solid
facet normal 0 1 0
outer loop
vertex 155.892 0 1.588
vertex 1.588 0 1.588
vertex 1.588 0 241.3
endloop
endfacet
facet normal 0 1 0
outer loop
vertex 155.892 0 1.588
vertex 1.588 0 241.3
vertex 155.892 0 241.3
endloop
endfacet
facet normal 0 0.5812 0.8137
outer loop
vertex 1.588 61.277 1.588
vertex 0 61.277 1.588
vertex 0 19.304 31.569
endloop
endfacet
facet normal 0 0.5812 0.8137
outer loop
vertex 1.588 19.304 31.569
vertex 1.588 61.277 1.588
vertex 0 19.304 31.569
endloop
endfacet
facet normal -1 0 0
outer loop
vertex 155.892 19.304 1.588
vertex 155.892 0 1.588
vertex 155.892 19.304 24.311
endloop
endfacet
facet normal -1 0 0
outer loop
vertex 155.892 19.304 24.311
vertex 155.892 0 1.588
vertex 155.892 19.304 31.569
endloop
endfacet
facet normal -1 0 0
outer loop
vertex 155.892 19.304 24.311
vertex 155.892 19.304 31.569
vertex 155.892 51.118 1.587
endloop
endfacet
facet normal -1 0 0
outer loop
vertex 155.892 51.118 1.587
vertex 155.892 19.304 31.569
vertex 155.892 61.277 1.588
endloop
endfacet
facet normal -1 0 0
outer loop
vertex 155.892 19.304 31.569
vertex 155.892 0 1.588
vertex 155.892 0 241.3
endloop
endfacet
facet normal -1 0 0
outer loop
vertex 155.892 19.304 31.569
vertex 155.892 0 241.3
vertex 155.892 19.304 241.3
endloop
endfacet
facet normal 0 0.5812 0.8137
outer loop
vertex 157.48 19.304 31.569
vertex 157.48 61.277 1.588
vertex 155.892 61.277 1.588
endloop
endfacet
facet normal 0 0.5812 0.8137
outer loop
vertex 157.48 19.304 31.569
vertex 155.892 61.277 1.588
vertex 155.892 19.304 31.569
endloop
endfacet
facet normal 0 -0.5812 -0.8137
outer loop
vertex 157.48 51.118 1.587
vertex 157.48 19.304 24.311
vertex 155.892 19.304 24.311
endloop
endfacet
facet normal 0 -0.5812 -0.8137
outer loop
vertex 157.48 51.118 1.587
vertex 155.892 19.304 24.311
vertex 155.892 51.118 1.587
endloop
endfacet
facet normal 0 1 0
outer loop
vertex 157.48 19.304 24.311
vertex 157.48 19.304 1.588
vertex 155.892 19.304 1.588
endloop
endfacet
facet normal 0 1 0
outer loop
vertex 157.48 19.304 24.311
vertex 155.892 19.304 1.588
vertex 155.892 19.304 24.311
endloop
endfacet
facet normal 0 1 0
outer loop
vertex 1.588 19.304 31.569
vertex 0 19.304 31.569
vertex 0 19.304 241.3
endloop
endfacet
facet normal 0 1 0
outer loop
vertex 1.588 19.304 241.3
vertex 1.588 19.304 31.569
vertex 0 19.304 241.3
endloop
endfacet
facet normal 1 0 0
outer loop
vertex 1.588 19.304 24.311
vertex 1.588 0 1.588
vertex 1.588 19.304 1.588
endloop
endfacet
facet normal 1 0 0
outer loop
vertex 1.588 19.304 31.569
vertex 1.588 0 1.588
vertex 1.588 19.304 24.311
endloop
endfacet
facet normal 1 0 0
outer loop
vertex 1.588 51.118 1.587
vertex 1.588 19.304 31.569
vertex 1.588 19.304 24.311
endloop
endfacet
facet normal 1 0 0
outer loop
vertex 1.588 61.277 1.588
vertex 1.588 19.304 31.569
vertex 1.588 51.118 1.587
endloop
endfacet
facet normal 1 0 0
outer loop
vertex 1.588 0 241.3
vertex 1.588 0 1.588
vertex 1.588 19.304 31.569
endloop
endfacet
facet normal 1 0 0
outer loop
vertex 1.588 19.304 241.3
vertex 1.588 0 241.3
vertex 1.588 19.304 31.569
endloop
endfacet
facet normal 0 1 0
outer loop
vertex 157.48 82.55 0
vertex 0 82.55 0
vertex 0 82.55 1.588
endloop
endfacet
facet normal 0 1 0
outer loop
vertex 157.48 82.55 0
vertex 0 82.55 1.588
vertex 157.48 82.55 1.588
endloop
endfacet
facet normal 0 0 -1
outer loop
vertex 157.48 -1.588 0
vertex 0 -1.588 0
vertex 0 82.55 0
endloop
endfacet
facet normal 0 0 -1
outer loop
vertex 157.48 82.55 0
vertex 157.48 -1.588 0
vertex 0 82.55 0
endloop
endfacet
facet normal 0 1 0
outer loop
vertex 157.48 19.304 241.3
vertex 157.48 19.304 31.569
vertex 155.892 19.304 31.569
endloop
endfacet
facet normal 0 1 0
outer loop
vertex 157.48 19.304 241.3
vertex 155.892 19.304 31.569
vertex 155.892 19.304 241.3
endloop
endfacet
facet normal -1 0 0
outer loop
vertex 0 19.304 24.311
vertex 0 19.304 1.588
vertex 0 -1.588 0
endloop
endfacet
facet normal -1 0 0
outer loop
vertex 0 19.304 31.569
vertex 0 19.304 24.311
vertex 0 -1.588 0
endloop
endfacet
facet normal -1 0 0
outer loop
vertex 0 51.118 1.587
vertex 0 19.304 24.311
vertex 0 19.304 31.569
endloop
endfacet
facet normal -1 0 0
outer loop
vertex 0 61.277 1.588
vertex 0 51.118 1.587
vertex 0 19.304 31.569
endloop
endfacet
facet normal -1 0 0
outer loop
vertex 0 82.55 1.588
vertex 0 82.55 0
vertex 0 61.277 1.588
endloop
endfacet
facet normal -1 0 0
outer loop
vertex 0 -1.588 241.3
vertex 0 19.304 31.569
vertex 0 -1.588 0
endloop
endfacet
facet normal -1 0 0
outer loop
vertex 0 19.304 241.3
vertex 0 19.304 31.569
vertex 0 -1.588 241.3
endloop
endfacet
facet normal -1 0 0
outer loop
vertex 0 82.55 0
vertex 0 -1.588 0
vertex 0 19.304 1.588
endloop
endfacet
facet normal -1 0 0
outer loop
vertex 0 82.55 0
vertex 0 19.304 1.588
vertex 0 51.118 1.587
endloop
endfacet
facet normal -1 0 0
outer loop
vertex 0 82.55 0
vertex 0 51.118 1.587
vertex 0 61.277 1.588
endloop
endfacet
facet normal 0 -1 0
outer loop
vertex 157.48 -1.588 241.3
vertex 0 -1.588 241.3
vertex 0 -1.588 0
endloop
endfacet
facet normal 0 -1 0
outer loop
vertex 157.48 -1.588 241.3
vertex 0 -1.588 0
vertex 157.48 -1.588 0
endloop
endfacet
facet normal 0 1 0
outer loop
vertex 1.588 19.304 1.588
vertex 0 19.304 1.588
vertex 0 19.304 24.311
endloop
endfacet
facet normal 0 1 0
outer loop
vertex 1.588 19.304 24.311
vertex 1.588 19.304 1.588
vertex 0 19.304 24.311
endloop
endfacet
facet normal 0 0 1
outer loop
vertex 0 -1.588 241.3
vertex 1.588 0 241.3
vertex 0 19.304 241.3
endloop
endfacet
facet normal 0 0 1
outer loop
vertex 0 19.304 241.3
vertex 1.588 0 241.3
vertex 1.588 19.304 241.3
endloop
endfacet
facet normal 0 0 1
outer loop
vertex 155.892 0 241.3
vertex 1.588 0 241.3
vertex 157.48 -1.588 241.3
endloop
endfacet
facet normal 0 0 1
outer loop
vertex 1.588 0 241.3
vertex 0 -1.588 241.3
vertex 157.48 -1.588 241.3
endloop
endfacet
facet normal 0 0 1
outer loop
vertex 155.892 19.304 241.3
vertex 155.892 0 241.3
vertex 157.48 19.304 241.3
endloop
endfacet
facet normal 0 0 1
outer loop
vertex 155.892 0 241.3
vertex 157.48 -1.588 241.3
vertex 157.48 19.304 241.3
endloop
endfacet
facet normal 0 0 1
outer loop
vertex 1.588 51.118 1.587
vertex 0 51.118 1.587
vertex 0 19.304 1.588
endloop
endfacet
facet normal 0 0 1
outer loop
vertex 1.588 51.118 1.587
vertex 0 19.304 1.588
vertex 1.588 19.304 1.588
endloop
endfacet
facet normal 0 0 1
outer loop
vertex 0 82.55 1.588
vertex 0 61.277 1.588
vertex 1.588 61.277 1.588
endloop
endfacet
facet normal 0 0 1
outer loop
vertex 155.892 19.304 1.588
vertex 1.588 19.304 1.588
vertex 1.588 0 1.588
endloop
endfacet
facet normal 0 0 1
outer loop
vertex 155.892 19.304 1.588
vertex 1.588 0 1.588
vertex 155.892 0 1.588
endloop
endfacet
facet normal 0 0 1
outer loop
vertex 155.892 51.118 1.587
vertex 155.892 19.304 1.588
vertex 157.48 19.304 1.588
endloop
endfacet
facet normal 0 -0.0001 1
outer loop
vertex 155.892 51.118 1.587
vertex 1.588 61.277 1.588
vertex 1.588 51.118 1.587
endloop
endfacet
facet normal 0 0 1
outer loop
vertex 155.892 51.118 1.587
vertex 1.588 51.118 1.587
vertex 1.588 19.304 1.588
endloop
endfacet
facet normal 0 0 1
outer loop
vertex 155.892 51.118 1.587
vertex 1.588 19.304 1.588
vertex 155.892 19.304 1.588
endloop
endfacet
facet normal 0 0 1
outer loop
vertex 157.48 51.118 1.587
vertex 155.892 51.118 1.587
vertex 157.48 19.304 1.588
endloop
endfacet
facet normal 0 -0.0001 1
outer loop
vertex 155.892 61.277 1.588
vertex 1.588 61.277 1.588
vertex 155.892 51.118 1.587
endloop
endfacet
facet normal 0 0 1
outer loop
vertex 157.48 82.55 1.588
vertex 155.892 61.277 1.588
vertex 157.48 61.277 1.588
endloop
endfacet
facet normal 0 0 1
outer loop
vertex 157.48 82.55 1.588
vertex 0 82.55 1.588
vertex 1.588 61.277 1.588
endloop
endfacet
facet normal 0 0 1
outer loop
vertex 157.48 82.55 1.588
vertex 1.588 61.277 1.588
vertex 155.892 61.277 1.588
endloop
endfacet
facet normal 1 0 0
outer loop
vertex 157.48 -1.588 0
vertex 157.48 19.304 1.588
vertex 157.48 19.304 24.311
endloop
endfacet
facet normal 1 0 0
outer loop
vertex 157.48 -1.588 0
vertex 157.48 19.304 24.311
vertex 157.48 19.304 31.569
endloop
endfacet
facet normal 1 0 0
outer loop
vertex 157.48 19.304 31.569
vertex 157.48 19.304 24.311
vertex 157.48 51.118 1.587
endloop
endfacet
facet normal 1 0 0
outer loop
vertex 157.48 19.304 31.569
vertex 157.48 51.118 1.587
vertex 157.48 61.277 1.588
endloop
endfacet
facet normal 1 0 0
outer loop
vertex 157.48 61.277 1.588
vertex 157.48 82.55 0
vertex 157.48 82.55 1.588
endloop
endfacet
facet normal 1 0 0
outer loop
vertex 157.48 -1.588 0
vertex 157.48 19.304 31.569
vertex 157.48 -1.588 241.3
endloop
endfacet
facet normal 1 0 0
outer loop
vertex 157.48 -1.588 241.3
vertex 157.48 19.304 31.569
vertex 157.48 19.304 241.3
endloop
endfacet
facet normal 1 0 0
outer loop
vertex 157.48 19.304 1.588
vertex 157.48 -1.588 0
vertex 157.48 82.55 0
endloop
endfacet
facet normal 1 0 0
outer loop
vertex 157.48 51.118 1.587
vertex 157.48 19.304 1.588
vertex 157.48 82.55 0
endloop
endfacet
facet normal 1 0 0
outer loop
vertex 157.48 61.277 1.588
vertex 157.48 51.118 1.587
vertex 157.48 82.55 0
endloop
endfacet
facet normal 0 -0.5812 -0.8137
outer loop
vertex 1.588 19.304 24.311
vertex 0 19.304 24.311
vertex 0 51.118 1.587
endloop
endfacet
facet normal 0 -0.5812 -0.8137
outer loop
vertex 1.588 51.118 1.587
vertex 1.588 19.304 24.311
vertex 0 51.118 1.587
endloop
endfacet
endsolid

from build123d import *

# Parameters (mm, degrees)
F0_W      = 157.48
F0_H      = 82.55
F1_DEPTH  = 1.5875
F2_W      = 157.48
F2_H      = 241.3
F3_DEPTH  = 1.5875
F4_W      = 19.304
F4_H      = 241.3
F5_DEPTH  = 1.5875
F7_W      = 24.9697454274
F7_H      = 239.1684796894
F8_DEPTH  = 1.5875
F10_W     = 19.304
F10_H     = 241.3
F11_DEPTH = 1.5875
F13_DEPTH = 1.5875
F15_DEPTH = 1.5875


with BuildPart() as f1:
    # F0 (on Top) → F1 (new body)
    with BuildSketch(Plane.XY):
        with Locations((78.74, 41.275)):
            Rectangle(F0_W, F0_H)
    extrude(amount=F1_DEPTH)

    # F2 (on Front) → F3 (join)
    with BuildSketch(Plane.XZ):
        with Locations((78.74, 120.65)):
            Rectangle(F2_W, F2_H)
    extrude(amount=F3_DEPTH)

    # F4 (on Right) → F5 (join)
    with BuildSketch(Plane.YZ):
        with Locations((9.652, 120.65)):
            Rectangle(F4_W, F4_H)
    extrude(amount=F5_DEPTH)

    # F10 (on 3pt) → F11 (join)
    with BuildSketch(Plane.YZ.offset(157.48)):
        with Locations((9.652, 120.65)):
            Rectangle(F10_W, F10_H)
    extrude(amount=-F11_DEPTH)

    # F12 (on 3pt) → F13 (join)
    with BuildSketch(Plane.YZ.offset(157.48)):
        Polygon((63.5, 0), (0, 45.3571428571), (0, 38.1), (53.34, 0), align=None)
    extrude(amount=-F13_DEPTH)

    # F14 (on Right) → F15 (join)
    with BuildSketch(Plane.YZ):
        Polygon((63.5, 0), (0, 45.3571428571), (0, 38.1), (53.34, 0), align=None)
    extrude(amount=F15_DEPTH)


with BuildPart() as f8:
    # F7 (on 3pt) → F8 (new body)
    with BuildSketch(Plane.YZ.offset(157.48)):
        with Locations((12.4848727137, 121.3677601772)):
            Rectangle(F7_W, F7_H)
    extrude(amount=-F8_DEPTH)


solid = f1.part
